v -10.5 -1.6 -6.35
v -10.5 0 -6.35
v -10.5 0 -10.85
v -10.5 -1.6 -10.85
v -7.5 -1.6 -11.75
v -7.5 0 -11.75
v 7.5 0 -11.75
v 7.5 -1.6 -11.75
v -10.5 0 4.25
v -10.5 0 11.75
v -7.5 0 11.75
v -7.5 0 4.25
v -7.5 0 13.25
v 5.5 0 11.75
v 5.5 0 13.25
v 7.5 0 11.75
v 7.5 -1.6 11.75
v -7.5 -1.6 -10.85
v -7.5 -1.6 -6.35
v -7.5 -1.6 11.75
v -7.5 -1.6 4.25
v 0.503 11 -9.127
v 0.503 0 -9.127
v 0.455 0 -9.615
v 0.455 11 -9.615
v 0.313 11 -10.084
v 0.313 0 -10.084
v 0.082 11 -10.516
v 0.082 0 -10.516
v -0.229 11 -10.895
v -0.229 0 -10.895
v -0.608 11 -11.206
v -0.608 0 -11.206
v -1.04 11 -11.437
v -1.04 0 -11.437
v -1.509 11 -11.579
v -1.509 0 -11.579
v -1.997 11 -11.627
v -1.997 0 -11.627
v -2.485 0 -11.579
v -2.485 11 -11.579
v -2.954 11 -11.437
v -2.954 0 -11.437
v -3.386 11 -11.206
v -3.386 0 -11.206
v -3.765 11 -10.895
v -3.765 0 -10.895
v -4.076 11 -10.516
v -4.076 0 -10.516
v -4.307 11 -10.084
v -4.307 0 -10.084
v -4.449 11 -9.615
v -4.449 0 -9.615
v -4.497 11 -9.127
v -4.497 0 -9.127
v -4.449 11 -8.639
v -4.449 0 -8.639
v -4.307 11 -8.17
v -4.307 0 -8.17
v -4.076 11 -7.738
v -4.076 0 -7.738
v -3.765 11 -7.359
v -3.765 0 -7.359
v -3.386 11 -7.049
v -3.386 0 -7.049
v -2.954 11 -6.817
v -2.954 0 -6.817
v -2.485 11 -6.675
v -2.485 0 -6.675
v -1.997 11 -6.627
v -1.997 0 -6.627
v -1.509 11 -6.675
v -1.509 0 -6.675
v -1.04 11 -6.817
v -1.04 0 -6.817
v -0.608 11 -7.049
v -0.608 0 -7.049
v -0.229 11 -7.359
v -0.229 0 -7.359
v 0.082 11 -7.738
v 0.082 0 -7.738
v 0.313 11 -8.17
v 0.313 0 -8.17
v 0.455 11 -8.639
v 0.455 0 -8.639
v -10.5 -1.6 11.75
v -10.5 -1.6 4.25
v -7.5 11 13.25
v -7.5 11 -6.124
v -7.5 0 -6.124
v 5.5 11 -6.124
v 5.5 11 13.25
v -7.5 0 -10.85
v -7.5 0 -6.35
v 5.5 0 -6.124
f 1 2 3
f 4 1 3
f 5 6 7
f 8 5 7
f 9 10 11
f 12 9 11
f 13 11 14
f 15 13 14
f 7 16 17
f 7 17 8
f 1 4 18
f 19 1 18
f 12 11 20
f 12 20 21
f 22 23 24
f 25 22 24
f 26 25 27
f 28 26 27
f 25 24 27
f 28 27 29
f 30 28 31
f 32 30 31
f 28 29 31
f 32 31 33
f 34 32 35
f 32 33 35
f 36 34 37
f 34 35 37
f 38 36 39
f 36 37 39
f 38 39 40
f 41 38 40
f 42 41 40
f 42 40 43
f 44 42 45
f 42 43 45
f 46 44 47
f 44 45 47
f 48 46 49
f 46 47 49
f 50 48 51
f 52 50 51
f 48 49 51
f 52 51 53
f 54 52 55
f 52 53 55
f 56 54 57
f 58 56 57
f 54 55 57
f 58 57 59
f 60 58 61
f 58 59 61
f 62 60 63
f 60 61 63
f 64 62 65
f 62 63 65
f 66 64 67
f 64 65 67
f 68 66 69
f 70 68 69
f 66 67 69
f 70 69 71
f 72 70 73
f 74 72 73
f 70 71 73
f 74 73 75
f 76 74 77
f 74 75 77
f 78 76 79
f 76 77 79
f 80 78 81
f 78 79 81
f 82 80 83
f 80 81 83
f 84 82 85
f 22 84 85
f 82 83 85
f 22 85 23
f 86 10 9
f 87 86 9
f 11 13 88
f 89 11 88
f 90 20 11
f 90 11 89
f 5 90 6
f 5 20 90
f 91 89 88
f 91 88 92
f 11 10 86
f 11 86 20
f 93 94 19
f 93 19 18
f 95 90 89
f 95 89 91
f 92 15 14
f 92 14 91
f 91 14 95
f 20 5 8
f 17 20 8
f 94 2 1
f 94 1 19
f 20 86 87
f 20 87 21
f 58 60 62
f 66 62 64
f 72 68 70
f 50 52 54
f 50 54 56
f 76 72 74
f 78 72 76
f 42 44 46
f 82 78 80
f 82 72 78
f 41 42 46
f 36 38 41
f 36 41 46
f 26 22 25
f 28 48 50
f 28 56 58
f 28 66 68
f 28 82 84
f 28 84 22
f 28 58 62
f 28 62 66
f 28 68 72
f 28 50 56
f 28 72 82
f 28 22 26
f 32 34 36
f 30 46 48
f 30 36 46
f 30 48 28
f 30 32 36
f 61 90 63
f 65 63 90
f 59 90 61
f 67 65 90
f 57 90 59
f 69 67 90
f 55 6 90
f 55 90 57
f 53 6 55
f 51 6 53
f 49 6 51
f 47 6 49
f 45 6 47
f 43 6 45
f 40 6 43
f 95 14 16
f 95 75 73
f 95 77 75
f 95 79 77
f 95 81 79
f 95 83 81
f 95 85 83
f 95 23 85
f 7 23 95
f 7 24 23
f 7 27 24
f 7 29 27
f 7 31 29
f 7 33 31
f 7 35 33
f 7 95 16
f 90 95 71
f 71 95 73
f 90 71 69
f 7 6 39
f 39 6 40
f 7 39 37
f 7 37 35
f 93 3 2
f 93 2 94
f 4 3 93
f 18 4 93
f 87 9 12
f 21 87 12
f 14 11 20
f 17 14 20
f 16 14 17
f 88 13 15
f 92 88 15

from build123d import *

# Parameters (mm, degrees)
SKETCH1_W             = 15
SKETCH1_H             = 23.5
BOSS_EXTRUDE1_DEPTH   = 1.6
SKETCH2_W             = 3
SKETCH2_H             = 4.5
BOSS_EXTRUDE2_DEPTH   = 1.6
SKETCH2_H_2           = 7.5
BOSS_EXTRUDE2_2_DEPTH = 1.6
SKETCH3_R             = 2.5
SKETCH3_W             = 13
SKETCH3_H             = 19.373569216
BOSS_EXTRUDE3_DEPTH   = 11


with BuildPart() as part:
    # Sketch1 → Boss-Extrude1 (new body)
    with BuildSketch(Plane(origin=(0, 0, 0), x_dir=(1, 0, 0), z_dir=(0, 1, 0))):
        Rectangle(SKETCH1_W, SKETCH1_H)
    extrude(amount=-BOSS_EXTRUDE1_DEPTH)

    # Sketch3 → Boss-Extrude3 (add)
    with BuildSketch(Plane(origin=(0, 0, 0), x_dir=(1, 0, 0), z_dir=(0, 1, 0))):
        with Locations((-1.997077294, 9.127185205)):
            Circle(SKETCH3_R)
        with Locations((-1, -3.563215392)):
            Rectangle(SKETCH3_W, SKETCH3_H)
    extrude(amount=BOSS_EXTRUDE3_DEPTH)


with BuildPart() as body_2:
    # Sketch2 → Boss-Extrude2 (new body)
    with BuildSketch(Plane(origin=(0, 0, 0), x_dir=(1, 0, 0), z_dir=(0, 1, 0))):
        with Locations((-9, 8.6)):
            Rectangle(SKETCH2_W, SKETCH2_H)
    extrude(amount=-BOSS_EXTRUDE2_DEPTH)


with BuildPart() as body_3:
    # Sketch2 → Boss-Extrude2 2 (new body)
    with BuildSketch(Plane(origin=(0, 0, 0), x_dir=(1, 0, 0), z_dir=(0, 1, 0))):
        with Locations((-9, -8)):
            Rectangle(SKETCH2_W, SKETCH2_H_2)
    extrude(amount=-BOSS_EXTRUDE2_2_DEPTH)


solid = Compound([part.part, body_2.part, body_3.part])
